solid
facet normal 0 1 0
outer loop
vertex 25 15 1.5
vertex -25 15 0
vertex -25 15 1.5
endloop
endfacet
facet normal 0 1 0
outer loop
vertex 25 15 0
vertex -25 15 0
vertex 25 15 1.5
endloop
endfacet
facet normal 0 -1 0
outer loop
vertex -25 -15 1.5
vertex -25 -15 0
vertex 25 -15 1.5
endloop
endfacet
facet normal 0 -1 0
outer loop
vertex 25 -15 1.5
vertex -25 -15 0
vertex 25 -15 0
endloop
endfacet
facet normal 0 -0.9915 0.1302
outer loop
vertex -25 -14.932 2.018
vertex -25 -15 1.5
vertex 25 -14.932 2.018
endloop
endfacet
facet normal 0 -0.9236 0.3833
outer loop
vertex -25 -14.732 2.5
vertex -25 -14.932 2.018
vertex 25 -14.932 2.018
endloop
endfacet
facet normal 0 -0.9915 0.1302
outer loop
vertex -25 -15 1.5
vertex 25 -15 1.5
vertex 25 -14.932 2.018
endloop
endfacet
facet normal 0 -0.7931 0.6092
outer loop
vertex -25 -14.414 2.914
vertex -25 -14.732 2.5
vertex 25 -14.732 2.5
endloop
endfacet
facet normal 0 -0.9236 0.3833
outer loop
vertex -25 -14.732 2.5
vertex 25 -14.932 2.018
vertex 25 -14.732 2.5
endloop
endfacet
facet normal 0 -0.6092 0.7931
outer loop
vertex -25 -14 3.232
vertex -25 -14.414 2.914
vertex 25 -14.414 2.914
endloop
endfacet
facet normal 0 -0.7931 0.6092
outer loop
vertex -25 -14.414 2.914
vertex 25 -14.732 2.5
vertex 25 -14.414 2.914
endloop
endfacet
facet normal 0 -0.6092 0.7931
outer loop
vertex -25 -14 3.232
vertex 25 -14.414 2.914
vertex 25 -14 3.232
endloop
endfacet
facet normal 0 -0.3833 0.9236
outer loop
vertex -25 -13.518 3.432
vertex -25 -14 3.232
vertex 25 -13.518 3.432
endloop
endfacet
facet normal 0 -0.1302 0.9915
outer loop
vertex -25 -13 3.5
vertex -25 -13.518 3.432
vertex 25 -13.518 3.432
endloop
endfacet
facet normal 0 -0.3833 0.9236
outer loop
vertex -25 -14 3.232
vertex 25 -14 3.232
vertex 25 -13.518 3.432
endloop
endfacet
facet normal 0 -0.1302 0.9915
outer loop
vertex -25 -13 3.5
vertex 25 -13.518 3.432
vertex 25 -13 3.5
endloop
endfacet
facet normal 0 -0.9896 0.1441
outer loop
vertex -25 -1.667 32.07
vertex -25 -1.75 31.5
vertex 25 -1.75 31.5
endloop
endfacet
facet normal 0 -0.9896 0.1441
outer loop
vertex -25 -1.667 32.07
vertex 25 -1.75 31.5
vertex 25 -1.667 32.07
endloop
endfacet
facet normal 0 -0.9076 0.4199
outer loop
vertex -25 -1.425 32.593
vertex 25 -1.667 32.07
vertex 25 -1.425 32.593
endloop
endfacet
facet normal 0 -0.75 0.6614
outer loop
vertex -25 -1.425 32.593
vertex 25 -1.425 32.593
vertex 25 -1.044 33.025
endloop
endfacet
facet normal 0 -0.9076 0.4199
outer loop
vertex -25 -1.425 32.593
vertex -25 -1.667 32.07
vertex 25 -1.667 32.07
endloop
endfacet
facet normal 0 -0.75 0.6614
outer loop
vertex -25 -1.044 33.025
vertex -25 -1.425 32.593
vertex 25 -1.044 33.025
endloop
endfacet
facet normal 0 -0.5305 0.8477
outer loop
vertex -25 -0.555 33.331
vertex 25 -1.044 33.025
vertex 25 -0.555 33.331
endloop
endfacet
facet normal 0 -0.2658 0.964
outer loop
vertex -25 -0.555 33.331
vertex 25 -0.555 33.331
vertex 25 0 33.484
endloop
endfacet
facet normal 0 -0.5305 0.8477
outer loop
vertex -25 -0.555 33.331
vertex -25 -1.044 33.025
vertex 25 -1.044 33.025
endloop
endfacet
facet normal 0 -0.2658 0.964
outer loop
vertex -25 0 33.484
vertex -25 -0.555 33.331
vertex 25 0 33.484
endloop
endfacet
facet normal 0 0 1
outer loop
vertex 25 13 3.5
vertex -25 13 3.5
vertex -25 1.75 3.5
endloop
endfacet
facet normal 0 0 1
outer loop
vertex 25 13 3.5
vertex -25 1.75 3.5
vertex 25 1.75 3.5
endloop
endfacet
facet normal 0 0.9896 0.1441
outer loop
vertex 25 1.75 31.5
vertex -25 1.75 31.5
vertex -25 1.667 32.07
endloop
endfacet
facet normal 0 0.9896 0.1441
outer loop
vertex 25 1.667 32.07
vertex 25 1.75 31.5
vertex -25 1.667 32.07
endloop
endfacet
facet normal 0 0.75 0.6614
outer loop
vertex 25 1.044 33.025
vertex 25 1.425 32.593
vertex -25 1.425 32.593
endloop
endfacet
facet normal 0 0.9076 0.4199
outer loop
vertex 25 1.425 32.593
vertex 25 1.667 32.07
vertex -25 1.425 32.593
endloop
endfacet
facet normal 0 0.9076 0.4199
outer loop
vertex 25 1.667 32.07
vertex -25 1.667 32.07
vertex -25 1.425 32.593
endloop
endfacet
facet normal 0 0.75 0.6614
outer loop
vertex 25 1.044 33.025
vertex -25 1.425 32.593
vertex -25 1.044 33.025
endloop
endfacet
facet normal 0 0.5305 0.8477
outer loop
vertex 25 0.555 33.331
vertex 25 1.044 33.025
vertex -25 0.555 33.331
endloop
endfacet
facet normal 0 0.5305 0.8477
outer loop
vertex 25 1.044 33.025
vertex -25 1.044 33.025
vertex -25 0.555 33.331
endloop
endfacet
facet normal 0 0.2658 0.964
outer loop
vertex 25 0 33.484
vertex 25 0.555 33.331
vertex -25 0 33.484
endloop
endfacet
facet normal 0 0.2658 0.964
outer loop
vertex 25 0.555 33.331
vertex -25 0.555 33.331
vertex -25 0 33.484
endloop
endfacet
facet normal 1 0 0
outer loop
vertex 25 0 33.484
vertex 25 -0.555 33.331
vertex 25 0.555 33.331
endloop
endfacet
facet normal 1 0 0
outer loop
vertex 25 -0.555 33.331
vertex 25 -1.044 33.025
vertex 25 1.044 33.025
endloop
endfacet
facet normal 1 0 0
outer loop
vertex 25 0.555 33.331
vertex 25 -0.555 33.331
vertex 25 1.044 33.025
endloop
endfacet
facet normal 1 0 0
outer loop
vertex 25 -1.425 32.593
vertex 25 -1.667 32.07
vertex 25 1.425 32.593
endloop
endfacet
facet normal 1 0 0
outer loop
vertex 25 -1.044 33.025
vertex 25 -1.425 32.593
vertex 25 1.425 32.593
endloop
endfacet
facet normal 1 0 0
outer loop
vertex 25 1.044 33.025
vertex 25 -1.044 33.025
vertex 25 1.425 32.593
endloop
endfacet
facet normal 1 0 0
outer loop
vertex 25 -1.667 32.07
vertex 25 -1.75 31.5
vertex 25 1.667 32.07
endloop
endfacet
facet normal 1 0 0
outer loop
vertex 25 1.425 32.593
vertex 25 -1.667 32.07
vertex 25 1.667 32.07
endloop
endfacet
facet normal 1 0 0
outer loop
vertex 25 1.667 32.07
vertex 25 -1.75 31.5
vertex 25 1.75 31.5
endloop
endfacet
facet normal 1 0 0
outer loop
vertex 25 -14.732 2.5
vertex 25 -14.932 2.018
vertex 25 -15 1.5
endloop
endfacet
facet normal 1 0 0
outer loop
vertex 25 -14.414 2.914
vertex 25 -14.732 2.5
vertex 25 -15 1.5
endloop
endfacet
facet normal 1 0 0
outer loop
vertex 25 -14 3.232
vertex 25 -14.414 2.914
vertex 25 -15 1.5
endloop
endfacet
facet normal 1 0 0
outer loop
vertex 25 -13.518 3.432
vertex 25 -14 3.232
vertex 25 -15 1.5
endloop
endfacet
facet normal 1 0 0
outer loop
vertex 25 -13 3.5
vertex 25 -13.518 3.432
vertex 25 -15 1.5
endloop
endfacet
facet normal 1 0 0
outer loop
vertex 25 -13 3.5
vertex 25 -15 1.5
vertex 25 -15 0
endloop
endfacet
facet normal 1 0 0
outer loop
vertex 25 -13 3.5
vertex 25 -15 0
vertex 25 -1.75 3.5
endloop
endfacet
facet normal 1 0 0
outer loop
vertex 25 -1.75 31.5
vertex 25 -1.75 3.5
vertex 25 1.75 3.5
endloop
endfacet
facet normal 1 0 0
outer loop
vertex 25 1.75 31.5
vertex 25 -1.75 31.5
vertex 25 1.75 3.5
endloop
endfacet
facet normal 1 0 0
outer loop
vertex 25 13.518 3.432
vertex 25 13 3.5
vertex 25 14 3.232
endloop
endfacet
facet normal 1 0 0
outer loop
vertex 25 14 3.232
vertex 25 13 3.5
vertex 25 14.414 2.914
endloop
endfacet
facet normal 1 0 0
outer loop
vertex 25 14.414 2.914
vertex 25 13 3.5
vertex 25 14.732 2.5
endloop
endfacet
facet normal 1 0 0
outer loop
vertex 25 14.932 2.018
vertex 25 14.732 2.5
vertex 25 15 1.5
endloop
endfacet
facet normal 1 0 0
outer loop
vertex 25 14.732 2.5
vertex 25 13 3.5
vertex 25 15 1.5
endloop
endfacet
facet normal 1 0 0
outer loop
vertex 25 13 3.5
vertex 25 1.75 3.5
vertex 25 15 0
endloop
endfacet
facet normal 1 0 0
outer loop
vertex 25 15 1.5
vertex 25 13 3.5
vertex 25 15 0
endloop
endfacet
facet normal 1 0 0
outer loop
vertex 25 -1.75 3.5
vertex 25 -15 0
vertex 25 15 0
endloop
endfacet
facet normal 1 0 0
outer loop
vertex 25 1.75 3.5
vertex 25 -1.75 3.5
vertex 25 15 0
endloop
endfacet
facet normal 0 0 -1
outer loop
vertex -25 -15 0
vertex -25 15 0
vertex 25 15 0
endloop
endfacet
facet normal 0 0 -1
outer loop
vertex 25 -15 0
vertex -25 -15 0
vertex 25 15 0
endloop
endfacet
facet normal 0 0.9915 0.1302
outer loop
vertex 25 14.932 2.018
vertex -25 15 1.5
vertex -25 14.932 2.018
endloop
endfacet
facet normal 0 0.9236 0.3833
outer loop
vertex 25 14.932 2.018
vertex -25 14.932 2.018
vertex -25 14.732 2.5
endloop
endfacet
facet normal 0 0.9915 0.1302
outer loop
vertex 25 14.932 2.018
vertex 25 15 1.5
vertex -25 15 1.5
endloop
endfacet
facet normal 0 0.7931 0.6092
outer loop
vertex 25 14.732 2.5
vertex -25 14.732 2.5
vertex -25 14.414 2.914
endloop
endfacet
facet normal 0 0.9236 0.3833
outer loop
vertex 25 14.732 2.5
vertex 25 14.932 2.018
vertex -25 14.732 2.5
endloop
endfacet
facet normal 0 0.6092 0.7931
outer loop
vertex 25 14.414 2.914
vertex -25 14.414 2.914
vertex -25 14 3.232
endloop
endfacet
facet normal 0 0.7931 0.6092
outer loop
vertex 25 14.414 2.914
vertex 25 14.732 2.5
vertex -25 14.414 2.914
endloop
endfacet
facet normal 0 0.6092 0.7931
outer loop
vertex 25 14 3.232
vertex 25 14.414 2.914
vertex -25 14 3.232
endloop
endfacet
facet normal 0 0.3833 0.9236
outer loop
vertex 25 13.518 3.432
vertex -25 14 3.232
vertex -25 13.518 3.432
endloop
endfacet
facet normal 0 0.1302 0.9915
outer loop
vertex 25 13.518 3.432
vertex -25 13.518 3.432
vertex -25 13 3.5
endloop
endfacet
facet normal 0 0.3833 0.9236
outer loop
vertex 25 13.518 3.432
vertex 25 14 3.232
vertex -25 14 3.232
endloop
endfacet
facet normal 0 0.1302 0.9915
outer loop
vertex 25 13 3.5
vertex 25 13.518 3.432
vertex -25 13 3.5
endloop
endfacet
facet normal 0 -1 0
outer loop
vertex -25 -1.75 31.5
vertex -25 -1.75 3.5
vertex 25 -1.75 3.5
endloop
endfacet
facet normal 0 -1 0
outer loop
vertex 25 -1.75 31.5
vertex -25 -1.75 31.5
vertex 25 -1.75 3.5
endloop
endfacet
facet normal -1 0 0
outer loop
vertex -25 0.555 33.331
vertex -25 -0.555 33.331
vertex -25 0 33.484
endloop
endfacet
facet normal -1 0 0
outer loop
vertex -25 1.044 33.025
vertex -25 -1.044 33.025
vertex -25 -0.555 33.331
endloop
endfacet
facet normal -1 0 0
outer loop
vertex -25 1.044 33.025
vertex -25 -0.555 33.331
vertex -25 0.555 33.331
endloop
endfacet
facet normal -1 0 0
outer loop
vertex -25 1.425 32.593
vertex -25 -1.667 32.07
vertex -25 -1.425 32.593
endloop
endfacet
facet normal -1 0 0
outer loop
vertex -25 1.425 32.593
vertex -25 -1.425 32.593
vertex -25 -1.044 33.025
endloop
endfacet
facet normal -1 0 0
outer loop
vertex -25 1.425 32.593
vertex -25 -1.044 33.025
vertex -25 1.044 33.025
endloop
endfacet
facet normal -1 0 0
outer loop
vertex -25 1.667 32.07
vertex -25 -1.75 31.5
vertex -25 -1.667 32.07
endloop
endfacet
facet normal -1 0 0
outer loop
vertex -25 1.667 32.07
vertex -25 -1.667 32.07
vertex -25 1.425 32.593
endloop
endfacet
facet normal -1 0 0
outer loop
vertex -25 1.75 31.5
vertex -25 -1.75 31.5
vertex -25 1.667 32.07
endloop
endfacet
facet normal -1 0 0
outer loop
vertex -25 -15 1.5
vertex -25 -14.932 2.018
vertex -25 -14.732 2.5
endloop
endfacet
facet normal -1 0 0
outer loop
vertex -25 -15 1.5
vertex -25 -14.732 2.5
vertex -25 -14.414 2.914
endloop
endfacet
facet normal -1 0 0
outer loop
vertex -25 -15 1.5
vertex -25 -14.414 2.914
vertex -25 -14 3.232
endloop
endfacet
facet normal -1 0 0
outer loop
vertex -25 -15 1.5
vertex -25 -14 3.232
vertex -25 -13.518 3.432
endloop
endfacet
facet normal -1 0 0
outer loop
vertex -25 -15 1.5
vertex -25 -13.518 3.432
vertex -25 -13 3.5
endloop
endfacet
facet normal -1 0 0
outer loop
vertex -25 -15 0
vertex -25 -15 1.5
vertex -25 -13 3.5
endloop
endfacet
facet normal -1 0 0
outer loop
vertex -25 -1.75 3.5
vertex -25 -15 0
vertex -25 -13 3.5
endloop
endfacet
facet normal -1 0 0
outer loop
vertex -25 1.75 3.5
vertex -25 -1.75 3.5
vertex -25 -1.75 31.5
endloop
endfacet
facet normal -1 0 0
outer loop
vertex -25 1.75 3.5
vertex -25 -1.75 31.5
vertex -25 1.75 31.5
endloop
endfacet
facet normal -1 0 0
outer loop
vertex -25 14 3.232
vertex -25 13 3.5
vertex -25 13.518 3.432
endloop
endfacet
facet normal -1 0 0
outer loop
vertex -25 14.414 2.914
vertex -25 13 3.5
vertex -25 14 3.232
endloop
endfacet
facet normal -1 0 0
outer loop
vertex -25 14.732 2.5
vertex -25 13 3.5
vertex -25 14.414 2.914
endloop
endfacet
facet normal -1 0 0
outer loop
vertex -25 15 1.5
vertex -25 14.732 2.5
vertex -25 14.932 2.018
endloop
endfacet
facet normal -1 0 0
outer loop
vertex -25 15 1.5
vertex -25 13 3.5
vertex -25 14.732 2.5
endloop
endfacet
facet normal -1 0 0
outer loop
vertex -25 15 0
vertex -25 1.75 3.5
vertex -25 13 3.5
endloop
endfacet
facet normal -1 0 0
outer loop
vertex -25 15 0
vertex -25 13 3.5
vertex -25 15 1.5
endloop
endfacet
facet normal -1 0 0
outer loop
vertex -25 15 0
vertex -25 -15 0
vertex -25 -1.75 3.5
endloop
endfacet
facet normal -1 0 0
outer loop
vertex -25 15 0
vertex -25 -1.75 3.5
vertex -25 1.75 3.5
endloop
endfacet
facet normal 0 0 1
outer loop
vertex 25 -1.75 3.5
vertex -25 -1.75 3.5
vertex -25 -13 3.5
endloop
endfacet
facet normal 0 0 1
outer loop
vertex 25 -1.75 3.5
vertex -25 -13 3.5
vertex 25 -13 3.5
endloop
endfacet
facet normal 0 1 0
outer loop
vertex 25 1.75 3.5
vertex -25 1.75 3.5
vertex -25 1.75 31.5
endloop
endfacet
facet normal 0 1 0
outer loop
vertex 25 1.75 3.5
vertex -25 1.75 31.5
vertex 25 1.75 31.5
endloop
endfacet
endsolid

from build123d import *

# Parameters (mm, degrees)
F0_W        = 50
F0_H        = 30
F1_DEPTH    = 3.5
F2_R        = 2
F3_W        = 50
F3_H        = 3.5
F4_DEPTH    = 30
F5_T1_DEPTH = 60


# Not quite as in the source:
# - a fillet or chamfer that OpenCascade refuses, or shapes differently, is made with other operations: its cross-section is extruded or revolved along the edge and cut away or added


with BuildPart() as f1:
    # F0 (on Top) → F1 (new body)
    with BuildSketch(Plane.XY):
        Rectangle(F0_W, F0_H)
    extrude(amount=F1_DEPTH)

    # F2
    f2_edges = [f1.edges().sort_by_distance(p)[0] for p in [
        (0, 15, 3.5),
        (0, -15, 3.5),
    ]]
    fillet(f2_edges, radius=F2_R)

    # F3 (on face) → F4 (join)
    with BuildSketch(Plane.XY.offset(3.5)):
        Rectangle(F3_W, F3_H)
    extrude(amount=F4_DEPTH)

    # F5: fillet of radius 2 on 2 edges, made by hand

    # F5_s2 → F5_t1 (cut)
    with BuildSketch(Plane.YZ.offset(-30)):
        with BuildLine():
            ThreePointArc((-1.75, 31.5), (-1.1642135624, 32.9142135624), (0.25, 33.5))
            Line((0.25, 33.5), (-1.75, 33.5))
            Line((-1.75, 33.5), (-1.75, 31.5))
        make_face()
        with BuildLine():
            ThreePointArc((1.75, 31.5), (1.1642135624, 32.9142135624), (-0.25, 33.5))
            Line((-0.25, 33.5), (1.75, 33.5))
            Line((1.75, 33.5), (1.75, 31.5))
        make_face()
    extrude(amount=F5_T1_DEPTH, mode=Mode.SUBTRACT)


solid = f1.part
